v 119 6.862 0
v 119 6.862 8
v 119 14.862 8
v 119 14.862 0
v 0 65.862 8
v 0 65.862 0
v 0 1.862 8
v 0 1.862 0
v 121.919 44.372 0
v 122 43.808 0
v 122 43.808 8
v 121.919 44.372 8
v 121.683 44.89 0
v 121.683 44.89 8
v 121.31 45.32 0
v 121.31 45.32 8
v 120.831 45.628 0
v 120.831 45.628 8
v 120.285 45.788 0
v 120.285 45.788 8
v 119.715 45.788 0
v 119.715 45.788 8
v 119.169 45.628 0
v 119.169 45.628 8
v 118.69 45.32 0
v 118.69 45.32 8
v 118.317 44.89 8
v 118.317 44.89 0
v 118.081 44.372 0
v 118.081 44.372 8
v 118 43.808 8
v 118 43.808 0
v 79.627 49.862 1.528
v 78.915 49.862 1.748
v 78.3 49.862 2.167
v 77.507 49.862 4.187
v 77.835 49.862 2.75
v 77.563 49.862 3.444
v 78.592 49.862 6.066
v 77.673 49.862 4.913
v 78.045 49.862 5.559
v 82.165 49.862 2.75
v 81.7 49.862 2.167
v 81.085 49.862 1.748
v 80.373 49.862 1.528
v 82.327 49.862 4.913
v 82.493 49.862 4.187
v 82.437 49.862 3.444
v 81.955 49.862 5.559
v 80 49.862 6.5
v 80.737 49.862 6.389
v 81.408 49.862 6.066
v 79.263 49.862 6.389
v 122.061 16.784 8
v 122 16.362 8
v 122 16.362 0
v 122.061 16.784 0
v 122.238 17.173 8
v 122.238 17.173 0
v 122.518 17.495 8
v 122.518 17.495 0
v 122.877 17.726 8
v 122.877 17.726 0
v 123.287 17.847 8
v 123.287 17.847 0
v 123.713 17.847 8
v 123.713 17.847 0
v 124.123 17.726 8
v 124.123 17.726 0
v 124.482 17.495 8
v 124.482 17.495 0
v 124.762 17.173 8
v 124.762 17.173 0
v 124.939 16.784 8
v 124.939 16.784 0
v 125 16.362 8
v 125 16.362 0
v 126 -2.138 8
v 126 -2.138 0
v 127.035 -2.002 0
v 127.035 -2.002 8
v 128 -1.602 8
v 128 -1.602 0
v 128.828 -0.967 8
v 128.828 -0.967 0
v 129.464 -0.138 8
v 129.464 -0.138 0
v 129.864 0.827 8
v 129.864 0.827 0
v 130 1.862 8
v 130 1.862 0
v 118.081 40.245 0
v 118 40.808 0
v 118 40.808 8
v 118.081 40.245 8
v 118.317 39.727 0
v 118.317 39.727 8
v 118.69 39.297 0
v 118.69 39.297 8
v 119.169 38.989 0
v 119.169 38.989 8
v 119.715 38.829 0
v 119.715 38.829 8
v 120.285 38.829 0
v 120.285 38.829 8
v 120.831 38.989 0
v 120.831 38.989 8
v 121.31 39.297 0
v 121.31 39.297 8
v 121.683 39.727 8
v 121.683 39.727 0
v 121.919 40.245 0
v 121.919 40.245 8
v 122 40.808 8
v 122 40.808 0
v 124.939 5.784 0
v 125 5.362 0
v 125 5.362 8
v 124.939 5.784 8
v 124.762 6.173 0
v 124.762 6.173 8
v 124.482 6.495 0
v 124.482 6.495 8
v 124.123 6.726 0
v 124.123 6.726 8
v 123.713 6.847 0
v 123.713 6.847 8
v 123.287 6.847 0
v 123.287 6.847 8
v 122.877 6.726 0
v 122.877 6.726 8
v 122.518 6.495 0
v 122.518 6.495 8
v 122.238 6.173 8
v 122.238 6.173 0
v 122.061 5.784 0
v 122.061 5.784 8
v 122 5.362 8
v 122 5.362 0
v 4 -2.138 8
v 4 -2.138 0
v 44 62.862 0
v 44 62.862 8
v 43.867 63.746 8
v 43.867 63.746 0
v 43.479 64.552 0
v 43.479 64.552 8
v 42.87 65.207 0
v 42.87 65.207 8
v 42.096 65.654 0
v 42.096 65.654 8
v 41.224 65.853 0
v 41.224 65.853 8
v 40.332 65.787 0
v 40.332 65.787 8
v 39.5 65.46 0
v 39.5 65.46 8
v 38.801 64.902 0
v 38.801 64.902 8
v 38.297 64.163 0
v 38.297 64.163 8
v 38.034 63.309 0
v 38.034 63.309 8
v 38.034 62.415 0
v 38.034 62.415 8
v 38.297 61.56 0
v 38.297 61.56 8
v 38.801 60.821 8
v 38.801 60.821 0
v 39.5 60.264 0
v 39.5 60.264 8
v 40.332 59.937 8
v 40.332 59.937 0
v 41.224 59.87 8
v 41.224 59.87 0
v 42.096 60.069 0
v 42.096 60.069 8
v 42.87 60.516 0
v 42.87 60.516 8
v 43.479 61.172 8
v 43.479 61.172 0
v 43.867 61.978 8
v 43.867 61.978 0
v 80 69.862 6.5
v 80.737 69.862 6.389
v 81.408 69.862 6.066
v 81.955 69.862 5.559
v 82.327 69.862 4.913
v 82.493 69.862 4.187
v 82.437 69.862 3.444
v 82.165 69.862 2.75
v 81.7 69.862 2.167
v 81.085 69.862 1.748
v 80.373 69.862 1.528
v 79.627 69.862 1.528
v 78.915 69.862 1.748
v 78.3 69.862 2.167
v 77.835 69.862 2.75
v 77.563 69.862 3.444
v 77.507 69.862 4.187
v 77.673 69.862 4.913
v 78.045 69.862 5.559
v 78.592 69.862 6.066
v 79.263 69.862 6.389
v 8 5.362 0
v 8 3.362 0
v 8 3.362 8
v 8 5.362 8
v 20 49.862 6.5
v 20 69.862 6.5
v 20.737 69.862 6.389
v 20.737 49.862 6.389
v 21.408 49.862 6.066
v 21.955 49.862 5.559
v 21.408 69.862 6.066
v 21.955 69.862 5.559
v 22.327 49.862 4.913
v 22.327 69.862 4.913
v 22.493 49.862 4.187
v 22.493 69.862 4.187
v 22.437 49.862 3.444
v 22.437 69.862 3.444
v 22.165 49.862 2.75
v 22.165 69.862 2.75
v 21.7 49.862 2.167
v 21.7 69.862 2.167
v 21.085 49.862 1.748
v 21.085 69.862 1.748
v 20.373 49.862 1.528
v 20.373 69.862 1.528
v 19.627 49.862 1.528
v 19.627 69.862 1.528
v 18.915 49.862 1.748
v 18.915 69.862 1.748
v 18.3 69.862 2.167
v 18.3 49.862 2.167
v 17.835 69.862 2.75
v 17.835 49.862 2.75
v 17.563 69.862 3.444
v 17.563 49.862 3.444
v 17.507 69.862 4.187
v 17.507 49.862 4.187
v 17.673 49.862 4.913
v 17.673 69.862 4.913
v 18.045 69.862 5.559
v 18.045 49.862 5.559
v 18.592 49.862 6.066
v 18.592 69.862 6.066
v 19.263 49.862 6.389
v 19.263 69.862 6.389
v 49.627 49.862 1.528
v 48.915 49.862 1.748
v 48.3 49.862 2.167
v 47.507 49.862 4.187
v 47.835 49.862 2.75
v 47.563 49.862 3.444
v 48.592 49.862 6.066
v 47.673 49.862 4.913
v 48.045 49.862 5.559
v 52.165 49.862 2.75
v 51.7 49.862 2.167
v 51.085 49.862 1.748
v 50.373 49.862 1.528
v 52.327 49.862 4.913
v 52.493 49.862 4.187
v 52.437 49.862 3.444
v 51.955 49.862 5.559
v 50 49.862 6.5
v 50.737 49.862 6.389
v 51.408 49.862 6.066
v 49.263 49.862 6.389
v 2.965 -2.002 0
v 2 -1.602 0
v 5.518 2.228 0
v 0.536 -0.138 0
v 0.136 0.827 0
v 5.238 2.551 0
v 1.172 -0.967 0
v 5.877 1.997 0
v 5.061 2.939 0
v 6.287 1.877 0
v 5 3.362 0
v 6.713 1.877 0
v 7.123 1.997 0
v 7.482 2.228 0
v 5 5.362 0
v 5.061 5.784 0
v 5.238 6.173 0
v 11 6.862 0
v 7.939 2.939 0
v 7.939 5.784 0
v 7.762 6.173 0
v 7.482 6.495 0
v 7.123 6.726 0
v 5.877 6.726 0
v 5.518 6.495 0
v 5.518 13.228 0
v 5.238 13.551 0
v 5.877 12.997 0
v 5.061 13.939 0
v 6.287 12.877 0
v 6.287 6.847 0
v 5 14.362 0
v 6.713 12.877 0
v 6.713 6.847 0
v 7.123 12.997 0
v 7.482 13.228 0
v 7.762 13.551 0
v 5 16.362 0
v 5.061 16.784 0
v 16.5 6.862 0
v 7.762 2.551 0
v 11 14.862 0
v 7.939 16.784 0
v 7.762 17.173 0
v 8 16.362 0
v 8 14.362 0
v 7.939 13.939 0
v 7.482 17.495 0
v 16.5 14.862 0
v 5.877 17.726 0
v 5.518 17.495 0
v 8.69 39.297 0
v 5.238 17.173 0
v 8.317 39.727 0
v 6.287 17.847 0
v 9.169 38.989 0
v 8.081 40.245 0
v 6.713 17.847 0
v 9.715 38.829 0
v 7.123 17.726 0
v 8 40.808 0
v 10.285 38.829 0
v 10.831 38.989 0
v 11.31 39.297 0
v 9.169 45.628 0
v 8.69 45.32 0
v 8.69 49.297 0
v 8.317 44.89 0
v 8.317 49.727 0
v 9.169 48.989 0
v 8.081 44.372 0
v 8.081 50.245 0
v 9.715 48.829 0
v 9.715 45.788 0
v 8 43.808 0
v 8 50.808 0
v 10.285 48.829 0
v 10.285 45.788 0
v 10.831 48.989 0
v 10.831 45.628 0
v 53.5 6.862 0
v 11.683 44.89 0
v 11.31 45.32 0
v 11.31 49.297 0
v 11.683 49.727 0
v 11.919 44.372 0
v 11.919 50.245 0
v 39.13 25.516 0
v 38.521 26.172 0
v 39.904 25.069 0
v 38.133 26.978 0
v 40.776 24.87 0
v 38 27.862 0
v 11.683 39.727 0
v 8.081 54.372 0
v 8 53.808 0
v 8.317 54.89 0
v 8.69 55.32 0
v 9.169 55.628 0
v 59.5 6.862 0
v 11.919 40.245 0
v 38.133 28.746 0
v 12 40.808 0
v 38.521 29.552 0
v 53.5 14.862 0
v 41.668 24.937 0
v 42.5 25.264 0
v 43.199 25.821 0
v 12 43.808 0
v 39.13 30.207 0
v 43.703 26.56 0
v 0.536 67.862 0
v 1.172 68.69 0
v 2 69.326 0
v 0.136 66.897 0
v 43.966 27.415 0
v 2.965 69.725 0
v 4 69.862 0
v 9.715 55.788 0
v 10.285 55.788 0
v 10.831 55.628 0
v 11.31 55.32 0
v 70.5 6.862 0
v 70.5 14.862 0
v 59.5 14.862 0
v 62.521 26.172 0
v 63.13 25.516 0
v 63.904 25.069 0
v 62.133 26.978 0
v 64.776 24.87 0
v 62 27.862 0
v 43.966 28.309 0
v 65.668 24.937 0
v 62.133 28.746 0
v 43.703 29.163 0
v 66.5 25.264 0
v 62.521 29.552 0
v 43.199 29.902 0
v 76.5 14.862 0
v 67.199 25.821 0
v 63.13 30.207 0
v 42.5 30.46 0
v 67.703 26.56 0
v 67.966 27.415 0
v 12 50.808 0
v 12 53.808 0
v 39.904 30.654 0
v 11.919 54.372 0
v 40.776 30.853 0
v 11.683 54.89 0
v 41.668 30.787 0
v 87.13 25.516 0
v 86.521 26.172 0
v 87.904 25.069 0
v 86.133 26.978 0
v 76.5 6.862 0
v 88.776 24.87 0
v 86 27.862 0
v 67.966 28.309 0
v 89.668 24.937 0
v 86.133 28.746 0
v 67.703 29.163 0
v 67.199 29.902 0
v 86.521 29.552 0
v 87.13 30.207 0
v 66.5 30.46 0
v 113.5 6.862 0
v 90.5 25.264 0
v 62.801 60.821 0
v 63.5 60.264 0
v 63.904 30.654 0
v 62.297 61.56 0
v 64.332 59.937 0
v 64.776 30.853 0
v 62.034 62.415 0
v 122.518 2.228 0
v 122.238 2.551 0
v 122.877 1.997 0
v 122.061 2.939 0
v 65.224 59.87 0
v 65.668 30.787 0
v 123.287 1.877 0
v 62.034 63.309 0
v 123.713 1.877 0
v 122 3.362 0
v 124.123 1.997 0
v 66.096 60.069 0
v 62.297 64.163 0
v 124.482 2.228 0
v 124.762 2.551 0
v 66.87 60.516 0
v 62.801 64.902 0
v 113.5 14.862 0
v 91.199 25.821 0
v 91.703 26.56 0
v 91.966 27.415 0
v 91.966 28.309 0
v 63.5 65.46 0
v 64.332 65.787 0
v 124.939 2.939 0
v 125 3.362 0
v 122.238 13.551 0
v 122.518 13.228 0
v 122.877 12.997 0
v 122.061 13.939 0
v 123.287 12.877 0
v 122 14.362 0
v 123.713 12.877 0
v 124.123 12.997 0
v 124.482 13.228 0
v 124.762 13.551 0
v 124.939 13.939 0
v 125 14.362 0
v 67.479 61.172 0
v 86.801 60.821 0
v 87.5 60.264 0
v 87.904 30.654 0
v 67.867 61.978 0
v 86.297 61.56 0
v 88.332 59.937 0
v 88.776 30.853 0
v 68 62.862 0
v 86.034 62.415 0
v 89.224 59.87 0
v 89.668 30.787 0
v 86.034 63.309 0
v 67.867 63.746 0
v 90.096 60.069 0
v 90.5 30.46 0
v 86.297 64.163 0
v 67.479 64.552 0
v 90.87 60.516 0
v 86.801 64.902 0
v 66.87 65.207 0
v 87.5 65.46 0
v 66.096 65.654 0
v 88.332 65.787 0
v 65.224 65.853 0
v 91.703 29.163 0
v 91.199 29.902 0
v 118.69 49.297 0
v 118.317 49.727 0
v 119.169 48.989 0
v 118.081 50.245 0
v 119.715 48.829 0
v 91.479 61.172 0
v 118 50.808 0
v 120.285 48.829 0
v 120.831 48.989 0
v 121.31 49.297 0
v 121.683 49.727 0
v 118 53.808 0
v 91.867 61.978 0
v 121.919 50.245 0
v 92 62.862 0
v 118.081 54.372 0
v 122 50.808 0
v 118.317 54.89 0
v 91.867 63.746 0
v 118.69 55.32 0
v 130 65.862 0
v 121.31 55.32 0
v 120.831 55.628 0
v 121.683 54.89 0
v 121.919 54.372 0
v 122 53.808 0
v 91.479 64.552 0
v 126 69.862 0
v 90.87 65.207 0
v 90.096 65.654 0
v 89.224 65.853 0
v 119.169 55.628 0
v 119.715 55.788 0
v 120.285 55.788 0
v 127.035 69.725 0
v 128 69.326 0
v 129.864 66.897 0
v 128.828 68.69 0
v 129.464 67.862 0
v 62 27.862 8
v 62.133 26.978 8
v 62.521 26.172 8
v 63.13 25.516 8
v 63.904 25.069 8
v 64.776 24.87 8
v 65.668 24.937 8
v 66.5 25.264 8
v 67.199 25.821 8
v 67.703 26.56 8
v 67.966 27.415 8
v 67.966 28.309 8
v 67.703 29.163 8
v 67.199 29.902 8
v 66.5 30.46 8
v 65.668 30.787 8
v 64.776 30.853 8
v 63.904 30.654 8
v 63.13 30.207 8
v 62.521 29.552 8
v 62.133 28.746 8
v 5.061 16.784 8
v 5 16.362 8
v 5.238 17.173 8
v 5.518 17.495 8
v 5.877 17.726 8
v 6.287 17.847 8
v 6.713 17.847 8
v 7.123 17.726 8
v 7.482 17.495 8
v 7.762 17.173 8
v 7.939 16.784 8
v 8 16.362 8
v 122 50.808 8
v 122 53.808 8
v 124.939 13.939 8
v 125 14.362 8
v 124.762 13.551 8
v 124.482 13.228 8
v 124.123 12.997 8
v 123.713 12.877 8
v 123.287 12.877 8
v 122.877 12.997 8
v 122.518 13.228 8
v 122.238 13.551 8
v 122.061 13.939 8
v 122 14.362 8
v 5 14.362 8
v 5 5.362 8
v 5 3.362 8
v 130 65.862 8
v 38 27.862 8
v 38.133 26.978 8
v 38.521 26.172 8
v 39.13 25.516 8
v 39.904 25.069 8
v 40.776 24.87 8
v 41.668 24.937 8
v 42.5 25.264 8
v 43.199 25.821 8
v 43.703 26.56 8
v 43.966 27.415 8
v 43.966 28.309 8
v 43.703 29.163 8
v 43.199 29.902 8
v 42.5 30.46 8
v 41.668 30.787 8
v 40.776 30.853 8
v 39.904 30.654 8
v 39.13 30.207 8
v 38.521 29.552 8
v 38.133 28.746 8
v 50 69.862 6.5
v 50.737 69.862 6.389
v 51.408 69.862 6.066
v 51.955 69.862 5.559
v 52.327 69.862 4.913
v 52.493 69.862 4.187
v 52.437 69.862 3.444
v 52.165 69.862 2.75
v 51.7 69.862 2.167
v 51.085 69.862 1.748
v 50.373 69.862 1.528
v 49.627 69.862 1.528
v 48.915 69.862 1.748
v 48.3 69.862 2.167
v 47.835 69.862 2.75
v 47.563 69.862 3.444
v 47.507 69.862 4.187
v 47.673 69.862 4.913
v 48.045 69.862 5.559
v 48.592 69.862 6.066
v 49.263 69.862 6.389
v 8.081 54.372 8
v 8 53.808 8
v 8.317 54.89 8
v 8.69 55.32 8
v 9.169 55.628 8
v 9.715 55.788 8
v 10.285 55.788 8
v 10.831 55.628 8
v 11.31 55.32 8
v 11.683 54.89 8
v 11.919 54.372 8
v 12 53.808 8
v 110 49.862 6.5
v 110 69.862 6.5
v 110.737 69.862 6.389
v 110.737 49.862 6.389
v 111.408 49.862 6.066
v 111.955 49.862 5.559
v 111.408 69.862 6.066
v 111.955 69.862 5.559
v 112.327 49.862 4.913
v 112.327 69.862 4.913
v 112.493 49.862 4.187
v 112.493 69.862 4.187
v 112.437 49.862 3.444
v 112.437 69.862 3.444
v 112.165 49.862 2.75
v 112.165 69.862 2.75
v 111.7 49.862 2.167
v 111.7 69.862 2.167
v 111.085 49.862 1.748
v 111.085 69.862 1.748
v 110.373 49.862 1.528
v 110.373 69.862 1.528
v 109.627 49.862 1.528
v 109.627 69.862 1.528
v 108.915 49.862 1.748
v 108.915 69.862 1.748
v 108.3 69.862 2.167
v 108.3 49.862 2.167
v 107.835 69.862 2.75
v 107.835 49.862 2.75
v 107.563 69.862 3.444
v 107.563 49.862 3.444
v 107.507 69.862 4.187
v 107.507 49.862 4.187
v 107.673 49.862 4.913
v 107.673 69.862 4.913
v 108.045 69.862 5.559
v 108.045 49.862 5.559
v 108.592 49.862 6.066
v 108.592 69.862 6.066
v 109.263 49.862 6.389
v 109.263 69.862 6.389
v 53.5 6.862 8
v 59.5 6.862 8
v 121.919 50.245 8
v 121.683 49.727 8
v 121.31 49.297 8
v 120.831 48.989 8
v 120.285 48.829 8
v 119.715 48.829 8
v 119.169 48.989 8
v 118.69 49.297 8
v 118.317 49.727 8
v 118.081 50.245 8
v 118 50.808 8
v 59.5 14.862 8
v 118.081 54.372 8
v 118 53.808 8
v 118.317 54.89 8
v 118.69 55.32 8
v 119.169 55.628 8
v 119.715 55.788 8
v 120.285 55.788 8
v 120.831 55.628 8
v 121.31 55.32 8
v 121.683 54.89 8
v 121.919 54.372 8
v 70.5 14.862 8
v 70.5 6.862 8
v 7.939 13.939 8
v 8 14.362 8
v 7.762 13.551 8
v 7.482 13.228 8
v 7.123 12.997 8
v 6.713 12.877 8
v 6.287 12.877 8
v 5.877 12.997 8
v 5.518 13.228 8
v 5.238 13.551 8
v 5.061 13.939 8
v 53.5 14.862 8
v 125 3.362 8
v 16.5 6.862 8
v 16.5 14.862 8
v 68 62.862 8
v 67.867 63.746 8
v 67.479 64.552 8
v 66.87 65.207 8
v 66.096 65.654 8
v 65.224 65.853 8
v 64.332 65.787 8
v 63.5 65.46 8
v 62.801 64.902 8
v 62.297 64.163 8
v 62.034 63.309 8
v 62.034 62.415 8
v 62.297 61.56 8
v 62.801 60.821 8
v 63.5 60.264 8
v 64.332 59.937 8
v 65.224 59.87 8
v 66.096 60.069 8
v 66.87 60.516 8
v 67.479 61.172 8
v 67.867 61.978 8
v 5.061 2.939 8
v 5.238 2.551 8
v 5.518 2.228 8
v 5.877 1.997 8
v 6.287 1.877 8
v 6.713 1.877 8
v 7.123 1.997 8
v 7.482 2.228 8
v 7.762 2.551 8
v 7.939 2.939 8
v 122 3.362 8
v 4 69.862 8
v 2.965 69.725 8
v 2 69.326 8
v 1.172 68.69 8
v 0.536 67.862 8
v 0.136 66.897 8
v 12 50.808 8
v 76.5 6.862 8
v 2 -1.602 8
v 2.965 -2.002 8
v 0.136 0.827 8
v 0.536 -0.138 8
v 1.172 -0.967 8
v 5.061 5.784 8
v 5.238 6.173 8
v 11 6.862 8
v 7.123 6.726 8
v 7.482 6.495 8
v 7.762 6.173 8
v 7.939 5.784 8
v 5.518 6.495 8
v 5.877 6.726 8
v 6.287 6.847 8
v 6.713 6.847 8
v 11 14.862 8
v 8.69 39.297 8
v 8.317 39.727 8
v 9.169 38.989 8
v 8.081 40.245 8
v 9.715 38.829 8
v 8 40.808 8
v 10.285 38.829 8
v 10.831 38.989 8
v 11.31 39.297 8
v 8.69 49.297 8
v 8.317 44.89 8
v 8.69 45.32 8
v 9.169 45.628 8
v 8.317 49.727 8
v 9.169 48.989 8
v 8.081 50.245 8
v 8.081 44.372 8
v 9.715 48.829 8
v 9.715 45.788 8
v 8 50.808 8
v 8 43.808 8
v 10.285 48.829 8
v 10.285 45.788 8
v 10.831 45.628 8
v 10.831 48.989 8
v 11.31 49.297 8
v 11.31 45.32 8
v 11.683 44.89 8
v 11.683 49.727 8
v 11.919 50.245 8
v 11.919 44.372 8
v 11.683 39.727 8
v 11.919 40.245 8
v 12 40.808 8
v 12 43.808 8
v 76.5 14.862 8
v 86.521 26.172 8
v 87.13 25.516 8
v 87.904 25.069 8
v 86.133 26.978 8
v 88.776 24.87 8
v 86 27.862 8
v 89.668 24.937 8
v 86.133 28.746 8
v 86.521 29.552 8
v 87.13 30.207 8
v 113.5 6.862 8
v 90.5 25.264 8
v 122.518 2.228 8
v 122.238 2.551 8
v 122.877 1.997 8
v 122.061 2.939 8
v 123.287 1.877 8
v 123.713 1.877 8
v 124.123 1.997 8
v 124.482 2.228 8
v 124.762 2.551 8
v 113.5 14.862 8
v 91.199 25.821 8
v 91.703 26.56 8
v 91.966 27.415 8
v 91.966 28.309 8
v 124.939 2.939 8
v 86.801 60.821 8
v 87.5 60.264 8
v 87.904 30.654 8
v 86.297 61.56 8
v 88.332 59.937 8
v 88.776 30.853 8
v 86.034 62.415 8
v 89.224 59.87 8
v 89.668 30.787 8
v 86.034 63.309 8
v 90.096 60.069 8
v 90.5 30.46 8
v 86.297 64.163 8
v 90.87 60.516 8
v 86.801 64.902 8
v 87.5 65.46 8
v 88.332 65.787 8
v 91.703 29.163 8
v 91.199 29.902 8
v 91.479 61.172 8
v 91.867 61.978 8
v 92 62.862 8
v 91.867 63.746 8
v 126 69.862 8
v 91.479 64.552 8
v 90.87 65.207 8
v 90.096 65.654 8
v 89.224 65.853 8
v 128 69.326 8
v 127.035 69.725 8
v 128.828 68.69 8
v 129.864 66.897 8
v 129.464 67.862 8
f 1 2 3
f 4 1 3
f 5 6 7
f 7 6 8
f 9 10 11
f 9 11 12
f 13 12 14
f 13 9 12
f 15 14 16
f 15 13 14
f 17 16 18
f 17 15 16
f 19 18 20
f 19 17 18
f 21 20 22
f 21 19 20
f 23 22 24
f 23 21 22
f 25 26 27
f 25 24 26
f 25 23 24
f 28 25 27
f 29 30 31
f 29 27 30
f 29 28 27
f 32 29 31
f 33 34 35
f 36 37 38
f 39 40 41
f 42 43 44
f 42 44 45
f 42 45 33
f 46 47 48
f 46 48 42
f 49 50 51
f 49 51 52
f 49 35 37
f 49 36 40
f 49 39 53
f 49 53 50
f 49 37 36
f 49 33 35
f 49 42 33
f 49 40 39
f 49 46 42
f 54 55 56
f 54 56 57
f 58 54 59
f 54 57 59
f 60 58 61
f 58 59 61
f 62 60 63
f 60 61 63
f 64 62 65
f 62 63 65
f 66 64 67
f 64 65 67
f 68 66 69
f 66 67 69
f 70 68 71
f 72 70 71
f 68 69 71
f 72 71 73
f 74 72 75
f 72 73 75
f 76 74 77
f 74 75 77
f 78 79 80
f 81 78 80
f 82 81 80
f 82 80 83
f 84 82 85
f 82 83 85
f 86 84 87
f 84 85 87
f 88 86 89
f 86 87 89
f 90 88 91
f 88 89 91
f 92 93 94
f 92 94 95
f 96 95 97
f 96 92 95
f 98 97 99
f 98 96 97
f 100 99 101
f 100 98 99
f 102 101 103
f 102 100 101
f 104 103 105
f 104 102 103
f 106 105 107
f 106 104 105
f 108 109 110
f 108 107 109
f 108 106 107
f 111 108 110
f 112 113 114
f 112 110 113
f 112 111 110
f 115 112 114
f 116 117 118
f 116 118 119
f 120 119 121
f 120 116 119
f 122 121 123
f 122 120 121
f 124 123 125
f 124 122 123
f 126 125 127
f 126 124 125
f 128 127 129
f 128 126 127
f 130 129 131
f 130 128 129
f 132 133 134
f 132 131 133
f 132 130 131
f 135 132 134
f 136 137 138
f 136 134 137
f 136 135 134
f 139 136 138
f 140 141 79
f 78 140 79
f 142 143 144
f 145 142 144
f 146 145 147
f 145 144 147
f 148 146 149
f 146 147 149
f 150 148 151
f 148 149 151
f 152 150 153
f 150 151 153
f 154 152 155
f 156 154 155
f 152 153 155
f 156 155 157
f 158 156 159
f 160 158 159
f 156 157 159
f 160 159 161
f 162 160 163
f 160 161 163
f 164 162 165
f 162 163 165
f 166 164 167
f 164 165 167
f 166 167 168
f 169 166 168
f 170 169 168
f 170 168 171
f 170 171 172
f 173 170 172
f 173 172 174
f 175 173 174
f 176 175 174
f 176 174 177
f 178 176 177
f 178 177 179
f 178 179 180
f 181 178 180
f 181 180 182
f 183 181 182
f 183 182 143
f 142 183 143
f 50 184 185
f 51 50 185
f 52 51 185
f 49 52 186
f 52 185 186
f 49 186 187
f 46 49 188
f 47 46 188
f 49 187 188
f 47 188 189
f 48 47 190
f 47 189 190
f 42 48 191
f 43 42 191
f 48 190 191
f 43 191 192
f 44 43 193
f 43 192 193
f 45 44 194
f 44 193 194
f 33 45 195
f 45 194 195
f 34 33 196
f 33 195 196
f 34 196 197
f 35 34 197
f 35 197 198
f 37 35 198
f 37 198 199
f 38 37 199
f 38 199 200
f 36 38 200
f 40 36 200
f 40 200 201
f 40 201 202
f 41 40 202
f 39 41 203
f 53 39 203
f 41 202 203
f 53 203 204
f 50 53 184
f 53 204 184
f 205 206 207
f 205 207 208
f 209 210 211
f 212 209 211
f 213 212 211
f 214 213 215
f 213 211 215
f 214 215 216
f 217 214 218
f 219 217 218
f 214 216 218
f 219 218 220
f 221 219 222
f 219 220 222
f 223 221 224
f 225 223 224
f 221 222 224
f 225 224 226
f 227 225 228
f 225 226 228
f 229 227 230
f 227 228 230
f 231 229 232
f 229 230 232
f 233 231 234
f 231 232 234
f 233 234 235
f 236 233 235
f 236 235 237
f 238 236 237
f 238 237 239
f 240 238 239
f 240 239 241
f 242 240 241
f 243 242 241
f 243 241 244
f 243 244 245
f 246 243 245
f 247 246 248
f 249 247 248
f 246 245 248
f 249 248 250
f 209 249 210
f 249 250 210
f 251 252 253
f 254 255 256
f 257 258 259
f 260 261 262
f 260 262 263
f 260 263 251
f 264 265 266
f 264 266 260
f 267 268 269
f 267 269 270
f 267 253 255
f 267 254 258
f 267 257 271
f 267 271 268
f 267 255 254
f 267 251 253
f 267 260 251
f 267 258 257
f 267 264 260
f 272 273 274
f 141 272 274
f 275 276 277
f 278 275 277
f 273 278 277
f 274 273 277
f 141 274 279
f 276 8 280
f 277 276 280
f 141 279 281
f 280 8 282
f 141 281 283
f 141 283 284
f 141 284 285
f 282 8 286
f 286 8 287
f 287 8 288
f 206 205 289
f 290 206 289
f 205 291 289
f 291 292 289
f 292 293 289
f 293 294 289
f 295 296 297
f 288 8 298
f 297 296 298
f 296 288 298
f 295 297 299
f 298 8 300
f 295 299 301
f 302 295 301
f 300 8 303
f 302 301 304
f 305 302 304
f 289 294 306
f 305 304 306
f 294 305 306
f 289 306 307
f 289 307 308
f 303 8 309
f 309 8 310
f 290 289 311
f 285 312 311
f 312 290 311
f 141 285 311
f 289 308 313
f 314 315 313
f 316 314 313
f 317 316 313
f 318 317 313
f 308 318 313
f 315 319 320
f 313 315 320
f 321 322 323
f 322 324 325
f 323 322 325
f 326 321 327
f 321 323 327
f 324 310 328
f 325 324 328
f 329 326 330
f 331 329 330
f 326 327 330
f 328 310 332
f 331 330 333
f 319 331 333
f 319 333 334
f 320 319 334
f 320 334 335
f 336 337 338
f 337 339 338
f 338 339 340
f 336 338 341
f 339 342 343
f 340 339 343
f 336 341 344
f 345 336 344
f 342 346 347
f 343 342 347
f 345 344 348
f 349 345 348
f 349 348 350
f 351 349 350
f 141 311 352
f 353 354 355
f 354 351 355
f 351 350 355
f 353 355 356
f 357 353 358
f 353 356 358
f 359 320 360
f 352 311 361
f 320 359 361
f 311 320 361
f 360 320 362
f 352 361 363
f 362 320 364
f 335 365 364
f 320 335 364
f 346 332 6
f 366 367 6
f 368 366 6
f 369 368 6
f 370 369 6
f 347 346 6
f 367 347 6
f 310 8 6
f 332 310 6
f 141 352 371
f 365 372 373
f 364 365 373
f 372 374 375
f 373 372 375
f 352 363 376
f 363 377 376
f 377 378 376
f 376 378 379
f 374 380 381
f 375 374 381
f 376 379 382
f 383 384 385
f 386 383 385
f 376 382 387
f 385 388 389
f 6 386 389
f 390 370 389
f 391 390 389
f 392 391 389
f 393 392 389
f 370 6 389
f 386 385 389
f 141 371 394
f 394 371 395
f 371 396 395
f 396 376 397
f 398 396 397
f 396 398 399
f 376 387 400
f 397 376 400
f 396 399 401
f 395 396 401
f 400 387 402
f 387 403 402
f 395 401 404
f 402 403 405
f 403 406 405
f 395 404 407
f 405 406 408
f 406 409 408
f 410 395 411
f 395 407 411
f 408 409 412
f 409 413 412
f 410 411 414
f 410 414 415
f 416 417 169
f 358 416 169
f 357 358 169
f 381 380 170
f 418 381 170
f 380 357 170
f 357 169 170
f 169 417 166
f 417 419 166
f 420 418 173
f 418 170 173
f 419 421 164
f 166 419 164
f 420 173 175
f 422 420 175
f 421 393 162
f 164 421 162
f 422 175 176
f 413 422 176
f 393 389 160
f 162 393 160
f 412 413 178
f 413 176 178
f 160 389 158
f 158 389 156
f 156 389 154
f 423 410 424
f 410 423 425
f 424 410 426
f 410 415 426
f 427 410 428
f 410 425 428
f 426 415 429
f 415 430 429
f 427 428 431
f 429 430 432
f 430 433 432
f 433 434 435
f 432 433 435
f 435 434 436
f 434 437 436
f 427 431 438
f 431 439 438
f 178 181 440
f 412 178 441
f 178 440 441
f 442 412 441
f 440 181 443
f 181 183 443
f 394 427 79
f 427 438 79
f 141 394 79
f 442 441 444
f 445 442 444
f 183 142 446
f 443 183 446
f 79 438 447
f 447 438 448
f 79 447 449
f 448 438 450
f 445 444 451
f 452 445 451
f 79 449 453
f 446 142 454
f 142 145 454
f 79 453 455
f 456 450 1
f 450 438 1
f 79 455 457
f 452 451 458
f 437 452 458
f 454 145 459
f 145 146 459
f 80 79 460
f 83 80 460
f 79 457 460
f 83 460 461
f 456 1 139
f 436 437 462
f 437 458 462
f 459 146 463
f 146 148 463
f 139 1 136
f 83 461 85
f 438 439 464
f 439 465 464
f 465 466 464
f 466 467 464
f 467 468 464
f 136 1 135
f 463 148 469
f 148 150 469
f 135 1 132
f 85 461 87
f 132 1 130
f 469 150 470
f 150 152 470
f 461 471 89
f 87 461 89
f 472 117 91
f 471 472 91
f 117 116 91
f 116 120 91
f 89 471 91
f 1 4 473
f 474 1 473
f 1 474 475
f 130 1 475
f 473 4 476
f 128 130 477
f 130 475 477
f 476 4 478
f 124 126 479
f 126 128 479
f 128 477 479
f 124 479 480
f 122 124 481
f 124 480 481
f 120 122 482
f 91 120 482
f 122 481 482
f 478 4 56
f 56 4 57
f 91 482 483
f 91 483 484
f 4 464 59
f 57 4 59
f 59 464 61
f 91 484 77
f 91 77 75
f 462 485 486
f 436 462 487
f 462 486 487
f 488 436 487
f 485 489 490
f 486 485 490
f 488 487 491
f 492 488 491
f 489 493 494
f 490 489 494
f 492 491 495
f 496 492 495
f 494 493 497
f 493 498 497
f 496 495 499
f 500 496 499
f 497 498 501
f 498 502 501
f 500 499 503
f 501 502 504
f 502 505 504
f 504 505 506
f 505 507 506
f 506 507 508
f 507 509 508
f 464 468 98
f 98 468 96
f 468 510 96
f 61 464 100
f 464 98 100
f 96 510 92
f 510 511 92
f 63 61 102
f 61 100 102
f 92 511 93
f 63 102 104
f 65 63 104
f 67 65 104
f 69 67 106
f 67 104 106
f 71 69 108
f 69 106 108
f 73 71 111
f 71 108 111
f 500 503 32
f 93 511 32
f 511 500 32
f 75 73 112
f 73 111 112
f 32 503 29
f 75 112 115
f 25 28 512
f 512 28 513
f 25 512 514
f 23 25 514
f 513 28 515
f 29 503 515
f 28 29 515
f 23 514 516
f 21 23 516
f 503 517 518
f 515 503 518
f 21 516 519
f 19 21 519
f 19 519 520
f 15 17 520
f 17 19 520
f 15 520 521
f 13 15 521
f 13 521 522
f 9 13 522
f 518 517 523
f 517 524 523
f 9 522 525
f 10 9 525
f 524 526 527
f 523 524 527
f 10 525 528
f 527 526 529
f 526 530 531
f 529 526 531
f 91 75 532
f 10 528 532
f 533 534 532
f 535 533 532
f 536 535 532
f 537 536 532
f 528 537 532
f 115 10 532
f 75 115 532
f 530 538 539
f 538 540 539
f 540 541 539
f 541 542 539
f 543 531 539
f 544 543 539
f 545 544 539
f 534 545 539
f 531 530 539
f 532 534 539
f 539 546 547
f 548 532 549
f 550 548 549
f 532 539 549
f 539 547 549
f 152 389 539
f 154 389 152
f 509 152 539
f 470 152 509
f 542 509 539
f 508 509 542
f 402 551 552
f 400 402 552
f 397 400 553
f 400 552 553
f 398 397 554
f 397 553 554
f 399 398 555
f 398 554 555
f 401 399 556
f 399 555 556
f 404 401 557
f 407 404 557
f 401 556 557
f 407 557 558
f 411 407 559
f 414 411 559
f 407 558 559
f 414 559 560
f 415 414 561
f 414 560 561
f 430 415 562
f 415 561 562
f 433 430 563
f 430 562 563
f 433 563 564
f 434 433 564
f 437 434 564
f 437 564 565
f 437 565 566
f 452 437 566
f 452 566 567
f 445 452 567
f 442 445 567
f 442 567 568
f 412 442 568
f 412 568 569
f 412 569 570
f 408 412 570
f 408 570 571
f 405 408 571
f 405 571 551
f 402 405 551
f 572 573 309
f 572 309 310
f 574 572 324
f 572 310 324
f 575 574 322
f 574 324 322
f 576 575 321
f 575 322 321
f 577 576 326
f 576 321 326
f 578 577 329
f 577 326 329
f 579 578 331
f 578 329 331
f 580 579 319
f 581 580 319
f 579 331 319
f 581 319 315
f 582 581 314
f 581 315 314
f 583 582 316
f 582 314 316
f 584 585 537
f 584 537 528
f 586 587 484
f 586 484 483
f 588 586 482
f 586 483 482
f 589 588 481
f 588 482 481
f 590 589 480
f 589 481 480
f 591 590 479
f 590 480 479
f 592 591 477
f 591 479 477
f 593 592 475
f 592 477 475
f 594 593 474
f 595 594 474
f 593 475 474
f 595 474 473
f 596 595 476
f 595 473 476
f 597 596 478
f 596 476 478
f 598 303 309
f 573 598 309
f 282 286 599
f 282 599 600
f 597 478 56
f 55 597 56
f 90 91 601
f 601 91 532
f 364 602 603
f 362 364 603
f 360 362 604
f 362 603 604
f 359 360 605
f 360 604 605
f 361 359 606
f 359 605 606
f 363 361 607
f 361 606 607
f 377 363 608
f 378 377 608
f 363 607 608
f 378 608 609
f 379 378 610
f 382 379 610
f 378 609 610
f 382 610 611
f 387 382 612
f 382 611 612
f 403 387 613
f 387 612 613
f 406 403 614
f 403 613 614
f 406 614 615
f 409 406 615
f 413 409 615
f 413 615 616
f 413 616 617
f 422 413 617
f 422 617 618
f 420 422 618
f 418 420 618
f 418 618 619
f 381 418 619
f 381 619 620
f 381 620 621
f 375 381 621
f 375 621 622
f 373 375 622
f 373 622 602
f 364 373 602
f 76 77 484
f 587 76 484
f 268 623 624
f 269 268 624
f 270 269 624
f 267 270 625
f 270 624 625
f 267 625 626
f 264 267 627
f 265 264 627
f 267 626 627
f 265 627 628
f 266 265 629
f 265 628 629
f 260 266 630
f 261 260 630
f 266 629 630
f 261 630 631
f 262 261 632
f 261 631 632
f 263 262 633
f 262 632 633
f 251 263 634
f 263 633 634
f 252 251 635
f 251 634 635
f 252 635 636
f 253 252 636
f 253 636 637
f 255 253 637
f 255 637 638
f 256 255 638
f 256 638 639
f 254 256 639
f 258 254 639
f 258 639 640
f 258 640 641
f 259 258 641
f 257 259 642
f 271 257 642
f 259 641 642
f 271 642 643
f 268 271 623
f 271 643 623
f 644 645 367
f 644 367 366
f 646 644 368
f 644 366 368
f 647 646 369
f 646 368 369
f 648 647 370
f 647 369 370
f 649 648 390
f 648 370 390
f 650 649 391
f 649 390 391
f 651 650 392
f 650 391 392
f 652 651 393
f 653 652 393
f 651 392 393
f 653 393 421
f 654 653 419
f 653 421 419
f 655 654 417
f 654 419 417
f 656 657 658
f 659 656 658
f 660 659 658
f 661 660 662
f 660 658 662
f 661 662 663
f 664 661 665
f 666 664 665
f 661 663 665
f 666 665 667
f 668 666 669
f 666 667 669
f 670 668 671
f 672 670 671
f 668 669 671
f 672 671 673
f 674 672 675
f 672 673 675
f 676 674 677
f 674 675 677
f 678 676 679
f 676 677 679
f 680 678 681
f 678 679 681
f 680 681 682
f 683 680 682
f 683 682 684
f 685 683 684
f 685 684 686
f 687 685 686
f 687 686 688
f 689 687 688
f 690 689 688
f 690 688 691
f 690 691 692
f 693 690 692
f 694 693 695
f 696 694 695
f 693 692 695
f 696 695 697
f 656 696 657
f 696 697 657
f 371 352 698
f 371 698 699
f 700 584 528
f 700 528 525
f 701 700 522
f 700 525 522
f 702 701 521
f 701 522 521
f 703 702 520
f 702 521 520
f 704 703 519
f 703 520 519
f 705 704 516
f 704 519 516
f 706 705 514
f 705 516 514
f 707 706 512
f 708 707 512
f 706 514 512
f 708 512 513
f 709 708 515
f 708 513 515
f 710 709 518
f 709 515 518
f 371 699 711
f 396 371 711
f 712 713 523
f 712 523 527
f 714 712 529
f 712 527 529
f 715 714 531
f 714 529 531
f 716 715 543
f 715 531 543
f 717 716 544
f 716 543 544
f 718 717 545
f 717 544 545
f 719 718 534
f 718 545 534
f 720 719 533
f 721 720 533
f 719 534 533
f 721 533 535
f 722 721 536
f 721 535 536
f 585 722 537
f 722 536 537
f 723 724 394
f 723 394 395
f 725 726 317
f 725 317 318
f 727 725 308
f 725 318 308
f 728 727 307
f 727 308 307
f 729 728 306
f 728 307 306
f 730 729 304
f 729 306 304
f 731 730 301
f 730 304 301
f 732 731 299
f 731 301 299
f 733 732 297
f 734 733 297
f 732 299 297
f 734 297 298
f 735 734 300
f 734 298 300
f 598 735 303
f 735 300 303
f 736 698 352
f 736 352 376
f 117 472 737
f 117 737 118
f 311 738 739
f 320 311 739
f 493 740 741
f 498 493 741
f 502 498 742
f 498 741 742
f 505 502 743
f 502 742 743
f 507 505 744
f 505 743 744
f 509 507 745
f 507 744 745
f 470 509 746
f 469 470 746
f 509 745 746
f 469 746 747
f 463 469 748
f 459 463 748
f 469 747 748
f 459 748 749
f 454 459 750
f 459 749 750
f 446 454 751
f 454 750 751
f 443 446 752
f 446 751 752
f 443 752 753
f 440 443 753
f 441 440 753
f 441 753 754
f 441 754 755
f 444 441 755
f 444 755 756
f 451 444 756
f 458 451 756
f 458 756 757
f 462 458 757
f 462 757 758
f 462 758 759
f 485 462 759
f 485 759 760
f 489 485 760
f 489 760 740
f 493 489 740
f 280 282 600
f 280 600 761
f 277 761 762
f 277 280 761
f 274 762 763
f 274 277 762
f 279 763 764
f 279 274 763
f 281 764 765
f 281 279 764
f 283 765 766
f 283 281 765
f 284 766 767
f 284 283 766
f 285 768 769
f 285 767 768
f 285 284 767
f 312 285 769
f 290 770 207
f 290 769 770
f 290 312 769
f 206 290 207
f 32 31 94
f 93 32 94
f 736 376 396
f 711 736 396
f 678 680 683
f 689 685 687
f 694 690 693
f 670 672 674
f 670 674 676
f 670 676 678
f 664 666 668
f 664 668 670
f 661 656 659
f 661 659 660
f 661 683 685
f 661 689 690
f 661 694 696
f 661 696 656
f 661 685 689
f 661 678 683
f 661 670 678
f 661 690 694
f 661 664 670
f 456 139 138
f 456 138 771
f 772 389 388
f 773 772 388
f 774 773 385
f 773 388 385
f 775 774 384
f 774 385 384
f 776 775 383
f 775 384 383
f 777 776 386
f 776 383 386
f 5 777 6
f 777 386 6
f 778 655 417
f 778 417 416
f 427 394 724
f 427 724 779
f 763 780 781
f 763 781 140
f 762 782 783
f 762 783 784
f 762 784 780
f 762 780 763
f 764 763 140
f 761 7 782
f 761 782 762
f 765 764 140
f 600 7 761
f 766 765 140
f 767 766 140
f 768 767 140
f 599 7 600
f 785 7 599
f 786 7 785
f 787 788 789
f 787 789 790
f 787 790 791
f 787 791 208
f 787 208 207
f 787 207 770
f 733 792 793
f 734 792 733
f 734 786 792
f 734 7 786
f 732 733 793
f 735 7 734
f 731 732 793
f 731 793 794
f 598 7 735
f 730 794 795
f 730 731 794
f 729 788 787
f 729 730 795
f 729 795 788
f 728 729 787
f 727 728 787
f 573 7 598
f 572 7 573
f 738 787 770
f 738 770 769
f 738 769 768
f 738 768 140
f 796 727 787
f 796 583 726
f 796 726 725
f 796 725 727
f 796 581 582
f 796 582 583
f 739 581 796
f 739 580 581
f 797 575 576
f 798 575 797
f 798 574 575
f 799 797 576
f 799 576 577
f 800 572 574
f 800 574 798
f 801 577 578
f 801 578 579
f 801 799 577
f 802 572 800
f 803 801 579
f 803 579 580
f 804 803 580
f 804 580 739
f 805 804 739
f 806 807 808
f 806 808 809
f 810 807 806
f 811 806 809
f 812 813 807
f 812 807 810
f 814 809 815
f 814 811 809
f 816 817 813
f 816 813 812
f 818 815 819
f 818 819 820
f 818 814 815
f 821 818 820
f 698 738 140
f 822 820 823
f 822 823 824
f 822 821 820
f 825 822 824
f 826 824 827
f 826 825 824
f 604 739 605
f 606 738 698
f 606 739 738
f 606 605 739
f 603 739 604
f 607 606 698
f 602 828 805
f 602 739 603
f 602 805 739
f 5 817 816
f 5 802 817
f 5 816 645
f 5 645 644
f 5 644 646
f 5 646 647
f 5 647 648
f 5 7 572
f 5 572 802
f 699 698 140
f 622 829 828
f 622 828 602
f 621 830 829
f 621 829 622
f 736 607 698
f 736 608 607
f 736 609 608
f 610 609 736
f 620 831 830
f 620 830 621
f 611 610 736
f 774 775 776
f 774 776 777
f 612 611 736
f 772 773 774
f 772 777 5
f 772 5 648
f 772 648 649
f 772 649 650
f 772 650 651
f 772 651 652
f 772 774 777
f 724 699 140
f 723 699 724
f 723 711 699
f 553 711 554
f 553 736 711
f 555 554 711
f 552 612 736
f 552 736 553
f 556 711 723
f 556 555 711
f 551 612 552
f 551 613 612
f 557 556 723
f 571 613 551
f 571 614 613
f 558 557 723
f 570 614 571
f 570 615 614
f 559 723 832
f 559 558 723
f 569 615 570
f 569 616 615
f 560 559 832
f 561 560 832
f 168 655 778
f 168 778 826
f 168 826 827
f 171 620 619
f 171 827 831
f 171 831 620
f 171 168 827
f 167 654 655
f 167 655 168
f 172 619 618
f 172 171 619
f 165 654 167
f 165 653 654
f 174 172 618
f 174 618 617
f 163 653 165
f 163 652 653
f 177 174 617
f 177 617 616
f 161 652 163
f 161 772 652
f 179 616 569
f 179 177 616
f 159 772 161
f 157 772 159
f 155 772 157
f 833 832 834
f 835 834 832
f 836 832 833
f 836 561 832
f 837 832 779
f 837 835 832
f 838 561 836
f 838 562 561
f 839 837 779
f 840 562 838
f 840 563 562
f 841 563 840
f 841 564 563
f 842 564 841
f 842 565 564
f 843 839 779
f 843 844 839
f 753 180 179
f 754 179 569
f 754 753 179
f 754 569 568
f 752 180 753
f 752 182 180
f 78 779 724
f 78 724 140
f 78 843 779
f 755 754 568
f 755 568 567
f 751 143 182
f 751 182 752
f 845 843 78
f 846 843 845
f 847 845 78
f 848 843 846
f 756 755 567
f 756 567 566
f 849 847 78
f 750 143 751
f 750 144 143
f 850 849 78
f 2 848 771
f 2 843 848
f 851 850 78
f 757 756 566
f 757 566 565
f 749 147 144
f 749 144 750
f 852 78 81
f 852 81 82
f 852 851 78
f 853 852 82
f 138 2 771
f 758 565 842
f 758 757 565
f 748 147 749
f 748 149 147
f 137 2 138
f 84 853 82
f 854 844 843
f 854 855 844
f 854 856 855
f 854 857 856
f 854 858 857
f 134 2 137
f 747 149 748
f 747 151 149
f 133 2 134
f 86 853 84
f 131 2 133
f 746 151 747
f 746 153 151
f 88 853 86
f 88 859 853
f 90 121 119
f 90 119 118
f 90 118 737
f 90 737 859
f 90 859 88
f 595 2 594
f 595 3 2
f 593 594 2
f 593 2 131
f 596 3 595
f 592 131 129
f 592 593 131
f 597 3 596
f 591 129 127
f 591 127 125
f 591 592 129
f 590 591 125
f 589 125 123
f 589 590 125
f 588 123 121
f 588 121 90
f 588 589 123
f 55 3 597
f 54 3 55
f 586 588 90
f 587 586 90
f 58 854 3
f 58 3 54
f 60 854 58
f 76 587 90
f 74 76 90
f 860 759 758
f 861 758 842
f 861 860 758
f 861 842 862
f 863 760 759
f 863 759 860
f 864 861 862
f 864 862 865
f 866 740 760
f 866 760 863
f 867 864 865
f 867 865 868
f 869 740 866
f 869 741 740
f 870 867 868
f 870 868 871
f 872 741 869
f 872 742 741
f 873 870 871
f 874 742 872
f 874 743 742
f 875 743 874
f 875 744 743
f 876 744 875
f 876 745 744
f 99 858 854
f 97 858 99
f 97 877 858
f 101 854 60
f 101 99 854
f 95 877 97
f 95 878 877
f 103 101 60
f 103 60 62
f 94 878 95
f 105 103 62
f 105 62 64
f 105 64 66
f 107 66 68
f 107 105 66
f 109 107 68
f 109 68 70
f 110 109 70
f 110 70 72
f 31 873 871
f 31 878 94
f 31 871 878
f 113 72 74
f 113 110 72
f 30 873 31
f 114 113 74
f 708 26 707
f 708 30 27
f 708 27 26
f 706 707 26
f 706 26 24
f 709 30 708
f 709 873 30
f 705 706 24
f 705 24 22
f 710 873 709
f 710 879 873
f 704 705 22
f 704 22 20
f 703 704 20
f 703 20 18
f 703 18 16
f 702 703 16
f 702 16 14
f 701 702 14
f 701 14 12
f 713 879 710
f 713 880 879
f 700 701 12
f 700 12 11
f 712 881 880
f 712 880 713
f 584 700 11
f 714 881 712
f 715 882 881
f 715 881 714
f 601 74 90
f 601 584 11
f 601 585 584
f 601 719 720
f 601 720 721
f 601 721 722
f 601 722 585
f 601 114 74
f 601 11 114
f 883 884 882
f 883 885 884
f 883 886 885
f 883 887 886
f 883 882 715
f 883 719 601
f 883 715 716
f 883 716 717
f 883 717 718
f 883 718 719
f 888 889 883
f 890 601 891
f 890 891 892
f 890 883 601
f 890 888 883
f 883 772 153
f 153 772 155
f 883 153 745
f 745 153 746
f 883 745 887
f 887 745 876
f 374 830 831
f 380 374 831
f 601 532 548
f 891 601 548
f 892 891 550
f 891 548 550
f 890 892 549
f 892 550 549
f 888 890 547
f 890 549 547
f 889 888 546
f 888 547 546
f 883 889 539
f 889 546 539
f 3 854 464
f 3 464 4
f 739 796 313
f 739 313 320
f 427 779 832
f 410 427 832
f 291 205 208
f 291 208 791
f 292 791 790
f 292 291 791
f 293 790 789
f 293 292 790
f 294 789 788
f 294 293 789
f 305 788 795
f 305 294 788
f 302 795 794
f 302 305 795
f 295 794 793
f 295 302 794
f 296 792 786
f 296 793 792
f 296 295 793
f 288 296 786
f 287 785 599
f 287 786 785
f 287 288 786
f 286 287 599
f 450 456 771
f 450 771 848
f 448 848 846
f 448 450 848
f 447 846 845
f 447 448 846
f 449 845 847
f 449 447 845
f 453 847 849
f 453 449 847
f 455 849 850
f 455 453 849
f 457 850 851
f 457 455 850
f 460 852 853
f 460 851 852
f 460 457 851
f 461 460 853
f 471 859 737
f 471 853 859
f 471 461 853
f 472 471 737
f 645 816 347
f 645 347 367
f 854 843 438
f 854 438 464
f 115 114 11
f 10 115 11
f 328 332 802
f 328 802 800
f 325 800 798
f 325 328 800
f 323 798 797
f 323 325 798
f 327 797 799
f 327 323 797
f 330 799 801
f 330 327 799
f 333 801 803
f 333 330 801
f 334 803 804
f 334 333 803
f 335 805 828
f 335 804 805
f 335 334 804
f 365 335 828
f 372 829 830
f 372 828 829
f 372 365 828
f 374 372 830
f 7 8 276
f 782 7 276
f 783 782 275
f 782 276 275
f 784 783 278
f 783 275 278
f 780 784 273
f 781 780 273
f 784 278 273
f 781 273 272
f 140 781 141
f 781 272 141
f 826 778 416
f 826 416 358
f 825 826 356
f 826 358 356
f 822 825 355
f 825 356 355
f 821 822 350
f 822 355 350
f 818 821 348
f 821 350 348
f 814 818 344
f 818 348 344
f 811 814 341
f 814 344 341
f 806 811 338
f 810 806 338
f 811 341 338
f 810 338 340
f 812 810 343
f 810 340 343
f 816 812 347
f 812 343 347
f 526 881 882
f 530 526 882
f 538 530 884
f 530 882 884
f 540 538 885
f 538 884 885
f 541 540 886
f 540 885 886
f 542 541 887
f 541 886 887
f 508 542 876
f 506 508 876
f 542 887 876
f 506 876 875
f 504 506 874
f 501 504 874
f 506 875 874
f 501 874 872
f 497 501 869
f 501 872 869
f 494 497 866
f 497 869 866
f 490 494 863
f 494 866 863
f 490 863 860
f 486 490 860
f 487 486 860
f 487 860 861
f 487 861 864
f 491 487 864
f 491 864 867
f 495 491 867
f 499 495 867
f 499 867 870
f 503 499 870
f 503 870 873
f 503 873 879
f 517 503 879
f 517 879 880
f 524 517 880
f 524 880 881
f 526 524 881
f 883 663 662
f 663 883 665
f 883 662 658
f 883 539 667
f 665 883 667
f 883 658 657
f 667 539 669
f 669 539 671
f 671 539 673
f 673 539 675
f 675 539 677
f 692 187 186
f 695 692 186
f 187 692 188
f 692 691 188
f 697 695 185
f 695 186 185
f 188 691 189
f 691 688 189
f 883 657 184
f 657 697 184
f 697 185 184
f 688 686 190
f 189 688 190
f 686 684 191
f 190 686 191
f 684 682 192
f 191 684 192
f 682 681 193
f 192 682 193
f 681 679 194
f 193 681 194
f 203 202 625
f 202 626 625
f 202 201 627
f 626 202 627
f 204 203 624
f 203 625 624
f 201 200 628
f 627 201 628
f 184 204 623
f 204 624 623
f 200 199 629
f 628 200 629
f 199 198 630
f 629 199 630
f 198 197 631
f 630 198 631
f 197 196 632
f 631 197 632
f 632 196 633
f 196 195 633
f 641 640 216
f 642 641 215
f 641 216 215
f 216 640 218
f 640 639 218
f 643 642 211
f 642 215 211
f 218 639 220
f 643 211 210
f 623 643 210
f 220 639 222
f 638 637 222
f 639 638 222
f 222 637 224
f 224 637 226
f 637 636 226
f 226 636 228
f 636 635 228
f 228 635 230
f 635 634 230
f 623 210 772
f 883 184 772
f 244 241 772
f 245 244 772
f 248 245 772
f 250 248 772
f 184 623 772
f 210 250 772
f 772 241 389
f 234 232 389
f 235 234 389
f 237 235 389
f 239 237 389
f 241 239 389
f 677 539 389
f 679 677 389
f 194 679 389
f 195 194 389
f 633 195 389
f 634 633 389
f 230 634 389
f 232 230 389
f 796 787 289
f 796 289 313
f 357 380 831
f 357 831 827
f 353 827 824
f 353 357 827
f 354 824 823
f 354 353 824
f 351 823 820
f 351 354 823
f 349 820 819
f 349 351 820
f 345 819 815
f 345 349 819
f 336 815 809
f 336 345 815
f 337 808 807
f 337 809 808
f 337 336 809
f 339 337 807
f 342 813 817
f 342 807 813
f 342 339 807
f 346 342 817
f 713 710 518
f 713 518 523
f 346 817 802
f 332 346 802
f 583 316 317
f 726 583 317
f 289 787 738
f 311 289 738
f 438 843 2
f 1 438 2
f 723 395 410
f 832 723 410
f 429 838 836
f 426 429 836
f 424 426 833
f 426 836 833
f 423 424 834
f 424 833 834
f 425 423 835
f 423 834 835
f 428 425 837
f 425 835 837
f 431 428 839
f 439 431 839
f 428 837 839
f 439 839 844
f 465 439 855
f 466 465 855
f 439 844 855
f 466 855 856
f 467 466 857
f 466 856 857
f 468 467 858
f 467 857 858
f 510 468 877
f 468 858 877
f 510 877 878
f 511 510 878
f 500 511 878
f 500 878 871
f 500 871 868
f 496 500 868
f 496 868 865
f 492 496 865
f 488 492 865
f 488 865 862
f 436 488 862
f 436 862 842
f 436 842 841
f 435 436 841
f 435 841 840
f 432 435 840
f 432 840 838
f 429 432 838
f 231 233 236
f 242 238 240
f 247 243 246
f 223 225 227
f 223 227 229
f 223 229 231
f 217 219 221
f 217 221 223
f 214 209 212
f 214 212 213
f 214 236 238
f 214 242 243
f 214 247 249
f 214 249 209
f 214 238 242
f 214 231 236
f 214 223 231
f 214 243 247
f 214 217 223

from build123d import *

# Parameters (mm, degrees)
BOSS_EXTRU_1_DEPTH       = 8
ESQUISSE2_W              = 5.5
ESQUISSE2_H              = 8
ESQUISSE2_W_2            = 6
ENL_V_MAT_EXTRU_1_DEPTH  = 10
ESQUISSE9_R              = 2.5
ENL_V_MAT_EXTRU_6_DEPTH  = 20
ESQUISSE10_R             = 3
ENL_V_MAT_EXTRU_7_DEPTH  = 148.799418472
ENL_V_MAT_EXTRU_12_DEPTH = 148.799418472
ENL_V_MAT_EXTRU_13_DEPTH = 148.799418472


with BuildPart() as part:
    # Esquisse1 → Boss.-Extru.1 (new body)
    with BuildSketch(Plane.XY):
        with BuildLine():
            Line((4, -2.138221462), (126, -2.138221462))
            ThreePointArc((126, -2.138221462), (128.828427125, -0.966648586), (130, 1.861778538))
            Line((130, 1.861778538), (130, 17.861778538))
            Line((130, 17.861778538), (130, 65.861778538))
            ThreePointArc((130, 65.861778538), (128.828427125, 68.690205663), (126, 69.861778538))
            Line((126, 69.861778538), (4, 69.861778538))
            ThreePointArc((4, 69.861778538), (1.171572875, 68.690205663), (0, 65.861778538))
            Line((0, 65.861778538), (0, 17.861778538))
            Line((0, 17.861778538), (0, 1.861778538))
            ThreePointArc((0, 1.861778538), (1.171572875, -0.966648586), (4, -2.138221462))
        make_face()
    extrude(amount=BOSS_EXTRU_1_DEPTH)

    # Esquisse2 → Enlèv. mat.-Extru.1 (cut)
    with BuildSketch(Plane.XY.offset(8)):
        with Locations((13.75, 10.861778538)):
            Rectangle(ESQUISSE2_W, ESQUISSE2_H)
        with Locations((56.5, 10.861778538)):
            Rectangle(ESQUISSE2_W_2, ESQUISSE2_H)
        with Locations((73.5, 10.861778538)):
            Rectangle(ESQUISSE2_W_2, ESQUISSE2_H)
        with Locations((116.25, 10.861778538)):
            Rectangle(ESQUISSE2_W, ESQUISSE2_H)
    extrude(amount=-ENL_V_MAT_EXTRU_1_DEPTH, mode=Mode.SUBTRACT)

    # Esquisse9 → Enlèv. mat.-Extru.6 (cut)
    with BuildSketch(Plane(origin=(0, 69.861778538, 0), x_dir=(1, 0, 0), z_dir=(0, 1, 0))):
        with Locations(Location((20, -4, 0), (0, 0, 270))):
            Circle(ESQUISSE9_R)
        with Locations(Location((50, -4, 0), (0, 0, 270))):
            Circle(ESQUISSE9_R)
        with Locations(Location((80, -4, 0), (0, 0, 270))):
            Circle(ESQUISSE9_R)
        with Locations(Location((110, -4, 0), (0, 0, 270))):
            Circle(ESQUISSE9_R)
    extrude(amount=-ENL_V_MAT_EXTRU_6_DEPTH, mode=Mode.SUBTRACT)

    # Esquisse10 → Enlèv. mat.-Extru.7 (cut, through all)
    with BuildSketch(Plane.XY.offset(8)):
        with Locations((41, 62.861778538)):
            Circle(ESQUISSE10_R)
        with Locations(Location((41, 27.861778538, 0), (0, 0, 180))):
            Circle(ESQUISSE10_R)
        with Locations((65, 62.861778538)):
            Circle(ESQUISSE10_R)
        with Locations(Location((65, 27.861778538, 0), (0, 0, 180))):
            Circle(ESQUISSE10_R)
        with Locations((89, 62.861778538)):
            Circle(ESQUISSE10_R)
        with Locations(Location((89, 27.861778538, 0), (0, 0, 180))):
            Circle(ESQUISSE10_R)
    extrude(amount=-ENL_V_MAT_EXTRU_7_DEPTH, mode=Mode.SUBTRACT)

    # Esquisse18 → Enlèv. mat.-Extru.12 (cut, through all)
    with BuildSketch(Plane(origin=(0, 0, 0), x_dir=(-1, 0, 0), z_dir=(0, 0, -1))):
        with BuildLine():
            Line((-125, 3.361778538), (-125, 5.361778538))
            ThreePointArc((-125, 5.361778538), (-123.5, 6.861778538), (-122, 5.361778538))
            Line((-122, 5.361778538), (-122, 3.361778538))
            ThreePointArc((-122, 3.361778538), (-123.5, 1.861778538), (-125, 3.361778538))
        make_face()
        with BuildLine():
            Line((-125, 16.361778538), (-125, 14.361778538))
            ThreePointArc((-125, 14.361778538), (-123.5, 12.861778538), (-122, 14.361778538))
            Line((-122, 14.361778538), (-122, 16.361778538))
            ThreePointArc((-122, 16.361778538), (-123.5, 17.861778538), (-125, 16.361778538))
        make_face()
        with BuildLine():
            Line((-8, 3.361778538), (-8, 5.361778538))
            ThreePointArc((-8, 5.361778538), (-6.5, 6.861778538), (-5, 5.361778538))
            Line((-5, 5.361778538), (-5, 3.361778538))
            ThreePointArc((-5, 3.361778538), (-6.5, 1.861778538), (-8, 3.361778538))
        make_face()
        with BuildLine():
            Line((-8, 16.361778538), (-8, 14.361778538))
            ThreePointArc((-8, 14.361778538), (-6.5, 12.861778538), (-5, 14.361778538))
            Line((-5, 14.361778538), (-5, 16.361778538))
            ThreePointArc((-5, 16.361778538), (-6.5, 17.861778538), (-8, 16.361778538))
        make_face()
    extrude(amount=-ENL_V_MAT_EXTRU_12_DEPTH, mode=Mode.SUBTRACT)

    # Esquisse21 → Enlèv. mat.-Extru.13 (cut, through all)
    with BuildSketch(Plane(origin=(0, 0, 0), x_dir=(-1, 0, 0), z_dir=(0, 0, -1))):
        with BuildLine():
            Line((-122, 40.808238571), (-122, 43.808238571))
            ThreePointArc((-122, 43.808238571), (-120, 45.808238571), (-118, 43.808238571))
            Line((-118, 43.808238571), (-118, 40.808238571))
            ThreePointArc((-118, 40.808238571), (-120, 38.808238571), (-122, 40.808238571))
        make_face()
        with BuildLine():
            Line((-122, 53.808238571), (-122, 50.808238571))
            ThreePointArc((-122, 50.808238571), (-120, 48.808238571), (-118, 50.808238571))
            Line((-118, 50.808238571), (-118, 53.808238571))
            ThreePointArc((-118, 53.808238571), (-120, 55.808238571), (-122, 53.808238571))
        make_face()
        with BuildLine():
            Line((-12, 40.808238571), (-12, 43.808238571))
            ThreePointArc((-12, 43.808238571), (-10, 45.808238571), (-8, 43.808238571))
            Line((-8, 43.808238571), (-8, 40.808238571))
            ThreePointArc((-8, 40.808238571), (-10, 38.808238571), (-12, 40.808238571))
        make_face()
        with BuildLine():
            Line((-12, 53.808238571), (-12, 50.808238571))
            ThreePointArc((-12, 50.808238571), (-10, 48.808238571), (-8, 50.808238571))
            Line((-8, 50.808238571), (-8, 53.808238571))
            ThreePointArc((-8, 53.808238571), (-10, 55.808238571), (-12, 53.808238571))
        make_face()
    extrude(amount=-ENL_V_MAT_EXTRU_13_DEPTH, mode=Mode.SUBTRACT)


solid = part.part
